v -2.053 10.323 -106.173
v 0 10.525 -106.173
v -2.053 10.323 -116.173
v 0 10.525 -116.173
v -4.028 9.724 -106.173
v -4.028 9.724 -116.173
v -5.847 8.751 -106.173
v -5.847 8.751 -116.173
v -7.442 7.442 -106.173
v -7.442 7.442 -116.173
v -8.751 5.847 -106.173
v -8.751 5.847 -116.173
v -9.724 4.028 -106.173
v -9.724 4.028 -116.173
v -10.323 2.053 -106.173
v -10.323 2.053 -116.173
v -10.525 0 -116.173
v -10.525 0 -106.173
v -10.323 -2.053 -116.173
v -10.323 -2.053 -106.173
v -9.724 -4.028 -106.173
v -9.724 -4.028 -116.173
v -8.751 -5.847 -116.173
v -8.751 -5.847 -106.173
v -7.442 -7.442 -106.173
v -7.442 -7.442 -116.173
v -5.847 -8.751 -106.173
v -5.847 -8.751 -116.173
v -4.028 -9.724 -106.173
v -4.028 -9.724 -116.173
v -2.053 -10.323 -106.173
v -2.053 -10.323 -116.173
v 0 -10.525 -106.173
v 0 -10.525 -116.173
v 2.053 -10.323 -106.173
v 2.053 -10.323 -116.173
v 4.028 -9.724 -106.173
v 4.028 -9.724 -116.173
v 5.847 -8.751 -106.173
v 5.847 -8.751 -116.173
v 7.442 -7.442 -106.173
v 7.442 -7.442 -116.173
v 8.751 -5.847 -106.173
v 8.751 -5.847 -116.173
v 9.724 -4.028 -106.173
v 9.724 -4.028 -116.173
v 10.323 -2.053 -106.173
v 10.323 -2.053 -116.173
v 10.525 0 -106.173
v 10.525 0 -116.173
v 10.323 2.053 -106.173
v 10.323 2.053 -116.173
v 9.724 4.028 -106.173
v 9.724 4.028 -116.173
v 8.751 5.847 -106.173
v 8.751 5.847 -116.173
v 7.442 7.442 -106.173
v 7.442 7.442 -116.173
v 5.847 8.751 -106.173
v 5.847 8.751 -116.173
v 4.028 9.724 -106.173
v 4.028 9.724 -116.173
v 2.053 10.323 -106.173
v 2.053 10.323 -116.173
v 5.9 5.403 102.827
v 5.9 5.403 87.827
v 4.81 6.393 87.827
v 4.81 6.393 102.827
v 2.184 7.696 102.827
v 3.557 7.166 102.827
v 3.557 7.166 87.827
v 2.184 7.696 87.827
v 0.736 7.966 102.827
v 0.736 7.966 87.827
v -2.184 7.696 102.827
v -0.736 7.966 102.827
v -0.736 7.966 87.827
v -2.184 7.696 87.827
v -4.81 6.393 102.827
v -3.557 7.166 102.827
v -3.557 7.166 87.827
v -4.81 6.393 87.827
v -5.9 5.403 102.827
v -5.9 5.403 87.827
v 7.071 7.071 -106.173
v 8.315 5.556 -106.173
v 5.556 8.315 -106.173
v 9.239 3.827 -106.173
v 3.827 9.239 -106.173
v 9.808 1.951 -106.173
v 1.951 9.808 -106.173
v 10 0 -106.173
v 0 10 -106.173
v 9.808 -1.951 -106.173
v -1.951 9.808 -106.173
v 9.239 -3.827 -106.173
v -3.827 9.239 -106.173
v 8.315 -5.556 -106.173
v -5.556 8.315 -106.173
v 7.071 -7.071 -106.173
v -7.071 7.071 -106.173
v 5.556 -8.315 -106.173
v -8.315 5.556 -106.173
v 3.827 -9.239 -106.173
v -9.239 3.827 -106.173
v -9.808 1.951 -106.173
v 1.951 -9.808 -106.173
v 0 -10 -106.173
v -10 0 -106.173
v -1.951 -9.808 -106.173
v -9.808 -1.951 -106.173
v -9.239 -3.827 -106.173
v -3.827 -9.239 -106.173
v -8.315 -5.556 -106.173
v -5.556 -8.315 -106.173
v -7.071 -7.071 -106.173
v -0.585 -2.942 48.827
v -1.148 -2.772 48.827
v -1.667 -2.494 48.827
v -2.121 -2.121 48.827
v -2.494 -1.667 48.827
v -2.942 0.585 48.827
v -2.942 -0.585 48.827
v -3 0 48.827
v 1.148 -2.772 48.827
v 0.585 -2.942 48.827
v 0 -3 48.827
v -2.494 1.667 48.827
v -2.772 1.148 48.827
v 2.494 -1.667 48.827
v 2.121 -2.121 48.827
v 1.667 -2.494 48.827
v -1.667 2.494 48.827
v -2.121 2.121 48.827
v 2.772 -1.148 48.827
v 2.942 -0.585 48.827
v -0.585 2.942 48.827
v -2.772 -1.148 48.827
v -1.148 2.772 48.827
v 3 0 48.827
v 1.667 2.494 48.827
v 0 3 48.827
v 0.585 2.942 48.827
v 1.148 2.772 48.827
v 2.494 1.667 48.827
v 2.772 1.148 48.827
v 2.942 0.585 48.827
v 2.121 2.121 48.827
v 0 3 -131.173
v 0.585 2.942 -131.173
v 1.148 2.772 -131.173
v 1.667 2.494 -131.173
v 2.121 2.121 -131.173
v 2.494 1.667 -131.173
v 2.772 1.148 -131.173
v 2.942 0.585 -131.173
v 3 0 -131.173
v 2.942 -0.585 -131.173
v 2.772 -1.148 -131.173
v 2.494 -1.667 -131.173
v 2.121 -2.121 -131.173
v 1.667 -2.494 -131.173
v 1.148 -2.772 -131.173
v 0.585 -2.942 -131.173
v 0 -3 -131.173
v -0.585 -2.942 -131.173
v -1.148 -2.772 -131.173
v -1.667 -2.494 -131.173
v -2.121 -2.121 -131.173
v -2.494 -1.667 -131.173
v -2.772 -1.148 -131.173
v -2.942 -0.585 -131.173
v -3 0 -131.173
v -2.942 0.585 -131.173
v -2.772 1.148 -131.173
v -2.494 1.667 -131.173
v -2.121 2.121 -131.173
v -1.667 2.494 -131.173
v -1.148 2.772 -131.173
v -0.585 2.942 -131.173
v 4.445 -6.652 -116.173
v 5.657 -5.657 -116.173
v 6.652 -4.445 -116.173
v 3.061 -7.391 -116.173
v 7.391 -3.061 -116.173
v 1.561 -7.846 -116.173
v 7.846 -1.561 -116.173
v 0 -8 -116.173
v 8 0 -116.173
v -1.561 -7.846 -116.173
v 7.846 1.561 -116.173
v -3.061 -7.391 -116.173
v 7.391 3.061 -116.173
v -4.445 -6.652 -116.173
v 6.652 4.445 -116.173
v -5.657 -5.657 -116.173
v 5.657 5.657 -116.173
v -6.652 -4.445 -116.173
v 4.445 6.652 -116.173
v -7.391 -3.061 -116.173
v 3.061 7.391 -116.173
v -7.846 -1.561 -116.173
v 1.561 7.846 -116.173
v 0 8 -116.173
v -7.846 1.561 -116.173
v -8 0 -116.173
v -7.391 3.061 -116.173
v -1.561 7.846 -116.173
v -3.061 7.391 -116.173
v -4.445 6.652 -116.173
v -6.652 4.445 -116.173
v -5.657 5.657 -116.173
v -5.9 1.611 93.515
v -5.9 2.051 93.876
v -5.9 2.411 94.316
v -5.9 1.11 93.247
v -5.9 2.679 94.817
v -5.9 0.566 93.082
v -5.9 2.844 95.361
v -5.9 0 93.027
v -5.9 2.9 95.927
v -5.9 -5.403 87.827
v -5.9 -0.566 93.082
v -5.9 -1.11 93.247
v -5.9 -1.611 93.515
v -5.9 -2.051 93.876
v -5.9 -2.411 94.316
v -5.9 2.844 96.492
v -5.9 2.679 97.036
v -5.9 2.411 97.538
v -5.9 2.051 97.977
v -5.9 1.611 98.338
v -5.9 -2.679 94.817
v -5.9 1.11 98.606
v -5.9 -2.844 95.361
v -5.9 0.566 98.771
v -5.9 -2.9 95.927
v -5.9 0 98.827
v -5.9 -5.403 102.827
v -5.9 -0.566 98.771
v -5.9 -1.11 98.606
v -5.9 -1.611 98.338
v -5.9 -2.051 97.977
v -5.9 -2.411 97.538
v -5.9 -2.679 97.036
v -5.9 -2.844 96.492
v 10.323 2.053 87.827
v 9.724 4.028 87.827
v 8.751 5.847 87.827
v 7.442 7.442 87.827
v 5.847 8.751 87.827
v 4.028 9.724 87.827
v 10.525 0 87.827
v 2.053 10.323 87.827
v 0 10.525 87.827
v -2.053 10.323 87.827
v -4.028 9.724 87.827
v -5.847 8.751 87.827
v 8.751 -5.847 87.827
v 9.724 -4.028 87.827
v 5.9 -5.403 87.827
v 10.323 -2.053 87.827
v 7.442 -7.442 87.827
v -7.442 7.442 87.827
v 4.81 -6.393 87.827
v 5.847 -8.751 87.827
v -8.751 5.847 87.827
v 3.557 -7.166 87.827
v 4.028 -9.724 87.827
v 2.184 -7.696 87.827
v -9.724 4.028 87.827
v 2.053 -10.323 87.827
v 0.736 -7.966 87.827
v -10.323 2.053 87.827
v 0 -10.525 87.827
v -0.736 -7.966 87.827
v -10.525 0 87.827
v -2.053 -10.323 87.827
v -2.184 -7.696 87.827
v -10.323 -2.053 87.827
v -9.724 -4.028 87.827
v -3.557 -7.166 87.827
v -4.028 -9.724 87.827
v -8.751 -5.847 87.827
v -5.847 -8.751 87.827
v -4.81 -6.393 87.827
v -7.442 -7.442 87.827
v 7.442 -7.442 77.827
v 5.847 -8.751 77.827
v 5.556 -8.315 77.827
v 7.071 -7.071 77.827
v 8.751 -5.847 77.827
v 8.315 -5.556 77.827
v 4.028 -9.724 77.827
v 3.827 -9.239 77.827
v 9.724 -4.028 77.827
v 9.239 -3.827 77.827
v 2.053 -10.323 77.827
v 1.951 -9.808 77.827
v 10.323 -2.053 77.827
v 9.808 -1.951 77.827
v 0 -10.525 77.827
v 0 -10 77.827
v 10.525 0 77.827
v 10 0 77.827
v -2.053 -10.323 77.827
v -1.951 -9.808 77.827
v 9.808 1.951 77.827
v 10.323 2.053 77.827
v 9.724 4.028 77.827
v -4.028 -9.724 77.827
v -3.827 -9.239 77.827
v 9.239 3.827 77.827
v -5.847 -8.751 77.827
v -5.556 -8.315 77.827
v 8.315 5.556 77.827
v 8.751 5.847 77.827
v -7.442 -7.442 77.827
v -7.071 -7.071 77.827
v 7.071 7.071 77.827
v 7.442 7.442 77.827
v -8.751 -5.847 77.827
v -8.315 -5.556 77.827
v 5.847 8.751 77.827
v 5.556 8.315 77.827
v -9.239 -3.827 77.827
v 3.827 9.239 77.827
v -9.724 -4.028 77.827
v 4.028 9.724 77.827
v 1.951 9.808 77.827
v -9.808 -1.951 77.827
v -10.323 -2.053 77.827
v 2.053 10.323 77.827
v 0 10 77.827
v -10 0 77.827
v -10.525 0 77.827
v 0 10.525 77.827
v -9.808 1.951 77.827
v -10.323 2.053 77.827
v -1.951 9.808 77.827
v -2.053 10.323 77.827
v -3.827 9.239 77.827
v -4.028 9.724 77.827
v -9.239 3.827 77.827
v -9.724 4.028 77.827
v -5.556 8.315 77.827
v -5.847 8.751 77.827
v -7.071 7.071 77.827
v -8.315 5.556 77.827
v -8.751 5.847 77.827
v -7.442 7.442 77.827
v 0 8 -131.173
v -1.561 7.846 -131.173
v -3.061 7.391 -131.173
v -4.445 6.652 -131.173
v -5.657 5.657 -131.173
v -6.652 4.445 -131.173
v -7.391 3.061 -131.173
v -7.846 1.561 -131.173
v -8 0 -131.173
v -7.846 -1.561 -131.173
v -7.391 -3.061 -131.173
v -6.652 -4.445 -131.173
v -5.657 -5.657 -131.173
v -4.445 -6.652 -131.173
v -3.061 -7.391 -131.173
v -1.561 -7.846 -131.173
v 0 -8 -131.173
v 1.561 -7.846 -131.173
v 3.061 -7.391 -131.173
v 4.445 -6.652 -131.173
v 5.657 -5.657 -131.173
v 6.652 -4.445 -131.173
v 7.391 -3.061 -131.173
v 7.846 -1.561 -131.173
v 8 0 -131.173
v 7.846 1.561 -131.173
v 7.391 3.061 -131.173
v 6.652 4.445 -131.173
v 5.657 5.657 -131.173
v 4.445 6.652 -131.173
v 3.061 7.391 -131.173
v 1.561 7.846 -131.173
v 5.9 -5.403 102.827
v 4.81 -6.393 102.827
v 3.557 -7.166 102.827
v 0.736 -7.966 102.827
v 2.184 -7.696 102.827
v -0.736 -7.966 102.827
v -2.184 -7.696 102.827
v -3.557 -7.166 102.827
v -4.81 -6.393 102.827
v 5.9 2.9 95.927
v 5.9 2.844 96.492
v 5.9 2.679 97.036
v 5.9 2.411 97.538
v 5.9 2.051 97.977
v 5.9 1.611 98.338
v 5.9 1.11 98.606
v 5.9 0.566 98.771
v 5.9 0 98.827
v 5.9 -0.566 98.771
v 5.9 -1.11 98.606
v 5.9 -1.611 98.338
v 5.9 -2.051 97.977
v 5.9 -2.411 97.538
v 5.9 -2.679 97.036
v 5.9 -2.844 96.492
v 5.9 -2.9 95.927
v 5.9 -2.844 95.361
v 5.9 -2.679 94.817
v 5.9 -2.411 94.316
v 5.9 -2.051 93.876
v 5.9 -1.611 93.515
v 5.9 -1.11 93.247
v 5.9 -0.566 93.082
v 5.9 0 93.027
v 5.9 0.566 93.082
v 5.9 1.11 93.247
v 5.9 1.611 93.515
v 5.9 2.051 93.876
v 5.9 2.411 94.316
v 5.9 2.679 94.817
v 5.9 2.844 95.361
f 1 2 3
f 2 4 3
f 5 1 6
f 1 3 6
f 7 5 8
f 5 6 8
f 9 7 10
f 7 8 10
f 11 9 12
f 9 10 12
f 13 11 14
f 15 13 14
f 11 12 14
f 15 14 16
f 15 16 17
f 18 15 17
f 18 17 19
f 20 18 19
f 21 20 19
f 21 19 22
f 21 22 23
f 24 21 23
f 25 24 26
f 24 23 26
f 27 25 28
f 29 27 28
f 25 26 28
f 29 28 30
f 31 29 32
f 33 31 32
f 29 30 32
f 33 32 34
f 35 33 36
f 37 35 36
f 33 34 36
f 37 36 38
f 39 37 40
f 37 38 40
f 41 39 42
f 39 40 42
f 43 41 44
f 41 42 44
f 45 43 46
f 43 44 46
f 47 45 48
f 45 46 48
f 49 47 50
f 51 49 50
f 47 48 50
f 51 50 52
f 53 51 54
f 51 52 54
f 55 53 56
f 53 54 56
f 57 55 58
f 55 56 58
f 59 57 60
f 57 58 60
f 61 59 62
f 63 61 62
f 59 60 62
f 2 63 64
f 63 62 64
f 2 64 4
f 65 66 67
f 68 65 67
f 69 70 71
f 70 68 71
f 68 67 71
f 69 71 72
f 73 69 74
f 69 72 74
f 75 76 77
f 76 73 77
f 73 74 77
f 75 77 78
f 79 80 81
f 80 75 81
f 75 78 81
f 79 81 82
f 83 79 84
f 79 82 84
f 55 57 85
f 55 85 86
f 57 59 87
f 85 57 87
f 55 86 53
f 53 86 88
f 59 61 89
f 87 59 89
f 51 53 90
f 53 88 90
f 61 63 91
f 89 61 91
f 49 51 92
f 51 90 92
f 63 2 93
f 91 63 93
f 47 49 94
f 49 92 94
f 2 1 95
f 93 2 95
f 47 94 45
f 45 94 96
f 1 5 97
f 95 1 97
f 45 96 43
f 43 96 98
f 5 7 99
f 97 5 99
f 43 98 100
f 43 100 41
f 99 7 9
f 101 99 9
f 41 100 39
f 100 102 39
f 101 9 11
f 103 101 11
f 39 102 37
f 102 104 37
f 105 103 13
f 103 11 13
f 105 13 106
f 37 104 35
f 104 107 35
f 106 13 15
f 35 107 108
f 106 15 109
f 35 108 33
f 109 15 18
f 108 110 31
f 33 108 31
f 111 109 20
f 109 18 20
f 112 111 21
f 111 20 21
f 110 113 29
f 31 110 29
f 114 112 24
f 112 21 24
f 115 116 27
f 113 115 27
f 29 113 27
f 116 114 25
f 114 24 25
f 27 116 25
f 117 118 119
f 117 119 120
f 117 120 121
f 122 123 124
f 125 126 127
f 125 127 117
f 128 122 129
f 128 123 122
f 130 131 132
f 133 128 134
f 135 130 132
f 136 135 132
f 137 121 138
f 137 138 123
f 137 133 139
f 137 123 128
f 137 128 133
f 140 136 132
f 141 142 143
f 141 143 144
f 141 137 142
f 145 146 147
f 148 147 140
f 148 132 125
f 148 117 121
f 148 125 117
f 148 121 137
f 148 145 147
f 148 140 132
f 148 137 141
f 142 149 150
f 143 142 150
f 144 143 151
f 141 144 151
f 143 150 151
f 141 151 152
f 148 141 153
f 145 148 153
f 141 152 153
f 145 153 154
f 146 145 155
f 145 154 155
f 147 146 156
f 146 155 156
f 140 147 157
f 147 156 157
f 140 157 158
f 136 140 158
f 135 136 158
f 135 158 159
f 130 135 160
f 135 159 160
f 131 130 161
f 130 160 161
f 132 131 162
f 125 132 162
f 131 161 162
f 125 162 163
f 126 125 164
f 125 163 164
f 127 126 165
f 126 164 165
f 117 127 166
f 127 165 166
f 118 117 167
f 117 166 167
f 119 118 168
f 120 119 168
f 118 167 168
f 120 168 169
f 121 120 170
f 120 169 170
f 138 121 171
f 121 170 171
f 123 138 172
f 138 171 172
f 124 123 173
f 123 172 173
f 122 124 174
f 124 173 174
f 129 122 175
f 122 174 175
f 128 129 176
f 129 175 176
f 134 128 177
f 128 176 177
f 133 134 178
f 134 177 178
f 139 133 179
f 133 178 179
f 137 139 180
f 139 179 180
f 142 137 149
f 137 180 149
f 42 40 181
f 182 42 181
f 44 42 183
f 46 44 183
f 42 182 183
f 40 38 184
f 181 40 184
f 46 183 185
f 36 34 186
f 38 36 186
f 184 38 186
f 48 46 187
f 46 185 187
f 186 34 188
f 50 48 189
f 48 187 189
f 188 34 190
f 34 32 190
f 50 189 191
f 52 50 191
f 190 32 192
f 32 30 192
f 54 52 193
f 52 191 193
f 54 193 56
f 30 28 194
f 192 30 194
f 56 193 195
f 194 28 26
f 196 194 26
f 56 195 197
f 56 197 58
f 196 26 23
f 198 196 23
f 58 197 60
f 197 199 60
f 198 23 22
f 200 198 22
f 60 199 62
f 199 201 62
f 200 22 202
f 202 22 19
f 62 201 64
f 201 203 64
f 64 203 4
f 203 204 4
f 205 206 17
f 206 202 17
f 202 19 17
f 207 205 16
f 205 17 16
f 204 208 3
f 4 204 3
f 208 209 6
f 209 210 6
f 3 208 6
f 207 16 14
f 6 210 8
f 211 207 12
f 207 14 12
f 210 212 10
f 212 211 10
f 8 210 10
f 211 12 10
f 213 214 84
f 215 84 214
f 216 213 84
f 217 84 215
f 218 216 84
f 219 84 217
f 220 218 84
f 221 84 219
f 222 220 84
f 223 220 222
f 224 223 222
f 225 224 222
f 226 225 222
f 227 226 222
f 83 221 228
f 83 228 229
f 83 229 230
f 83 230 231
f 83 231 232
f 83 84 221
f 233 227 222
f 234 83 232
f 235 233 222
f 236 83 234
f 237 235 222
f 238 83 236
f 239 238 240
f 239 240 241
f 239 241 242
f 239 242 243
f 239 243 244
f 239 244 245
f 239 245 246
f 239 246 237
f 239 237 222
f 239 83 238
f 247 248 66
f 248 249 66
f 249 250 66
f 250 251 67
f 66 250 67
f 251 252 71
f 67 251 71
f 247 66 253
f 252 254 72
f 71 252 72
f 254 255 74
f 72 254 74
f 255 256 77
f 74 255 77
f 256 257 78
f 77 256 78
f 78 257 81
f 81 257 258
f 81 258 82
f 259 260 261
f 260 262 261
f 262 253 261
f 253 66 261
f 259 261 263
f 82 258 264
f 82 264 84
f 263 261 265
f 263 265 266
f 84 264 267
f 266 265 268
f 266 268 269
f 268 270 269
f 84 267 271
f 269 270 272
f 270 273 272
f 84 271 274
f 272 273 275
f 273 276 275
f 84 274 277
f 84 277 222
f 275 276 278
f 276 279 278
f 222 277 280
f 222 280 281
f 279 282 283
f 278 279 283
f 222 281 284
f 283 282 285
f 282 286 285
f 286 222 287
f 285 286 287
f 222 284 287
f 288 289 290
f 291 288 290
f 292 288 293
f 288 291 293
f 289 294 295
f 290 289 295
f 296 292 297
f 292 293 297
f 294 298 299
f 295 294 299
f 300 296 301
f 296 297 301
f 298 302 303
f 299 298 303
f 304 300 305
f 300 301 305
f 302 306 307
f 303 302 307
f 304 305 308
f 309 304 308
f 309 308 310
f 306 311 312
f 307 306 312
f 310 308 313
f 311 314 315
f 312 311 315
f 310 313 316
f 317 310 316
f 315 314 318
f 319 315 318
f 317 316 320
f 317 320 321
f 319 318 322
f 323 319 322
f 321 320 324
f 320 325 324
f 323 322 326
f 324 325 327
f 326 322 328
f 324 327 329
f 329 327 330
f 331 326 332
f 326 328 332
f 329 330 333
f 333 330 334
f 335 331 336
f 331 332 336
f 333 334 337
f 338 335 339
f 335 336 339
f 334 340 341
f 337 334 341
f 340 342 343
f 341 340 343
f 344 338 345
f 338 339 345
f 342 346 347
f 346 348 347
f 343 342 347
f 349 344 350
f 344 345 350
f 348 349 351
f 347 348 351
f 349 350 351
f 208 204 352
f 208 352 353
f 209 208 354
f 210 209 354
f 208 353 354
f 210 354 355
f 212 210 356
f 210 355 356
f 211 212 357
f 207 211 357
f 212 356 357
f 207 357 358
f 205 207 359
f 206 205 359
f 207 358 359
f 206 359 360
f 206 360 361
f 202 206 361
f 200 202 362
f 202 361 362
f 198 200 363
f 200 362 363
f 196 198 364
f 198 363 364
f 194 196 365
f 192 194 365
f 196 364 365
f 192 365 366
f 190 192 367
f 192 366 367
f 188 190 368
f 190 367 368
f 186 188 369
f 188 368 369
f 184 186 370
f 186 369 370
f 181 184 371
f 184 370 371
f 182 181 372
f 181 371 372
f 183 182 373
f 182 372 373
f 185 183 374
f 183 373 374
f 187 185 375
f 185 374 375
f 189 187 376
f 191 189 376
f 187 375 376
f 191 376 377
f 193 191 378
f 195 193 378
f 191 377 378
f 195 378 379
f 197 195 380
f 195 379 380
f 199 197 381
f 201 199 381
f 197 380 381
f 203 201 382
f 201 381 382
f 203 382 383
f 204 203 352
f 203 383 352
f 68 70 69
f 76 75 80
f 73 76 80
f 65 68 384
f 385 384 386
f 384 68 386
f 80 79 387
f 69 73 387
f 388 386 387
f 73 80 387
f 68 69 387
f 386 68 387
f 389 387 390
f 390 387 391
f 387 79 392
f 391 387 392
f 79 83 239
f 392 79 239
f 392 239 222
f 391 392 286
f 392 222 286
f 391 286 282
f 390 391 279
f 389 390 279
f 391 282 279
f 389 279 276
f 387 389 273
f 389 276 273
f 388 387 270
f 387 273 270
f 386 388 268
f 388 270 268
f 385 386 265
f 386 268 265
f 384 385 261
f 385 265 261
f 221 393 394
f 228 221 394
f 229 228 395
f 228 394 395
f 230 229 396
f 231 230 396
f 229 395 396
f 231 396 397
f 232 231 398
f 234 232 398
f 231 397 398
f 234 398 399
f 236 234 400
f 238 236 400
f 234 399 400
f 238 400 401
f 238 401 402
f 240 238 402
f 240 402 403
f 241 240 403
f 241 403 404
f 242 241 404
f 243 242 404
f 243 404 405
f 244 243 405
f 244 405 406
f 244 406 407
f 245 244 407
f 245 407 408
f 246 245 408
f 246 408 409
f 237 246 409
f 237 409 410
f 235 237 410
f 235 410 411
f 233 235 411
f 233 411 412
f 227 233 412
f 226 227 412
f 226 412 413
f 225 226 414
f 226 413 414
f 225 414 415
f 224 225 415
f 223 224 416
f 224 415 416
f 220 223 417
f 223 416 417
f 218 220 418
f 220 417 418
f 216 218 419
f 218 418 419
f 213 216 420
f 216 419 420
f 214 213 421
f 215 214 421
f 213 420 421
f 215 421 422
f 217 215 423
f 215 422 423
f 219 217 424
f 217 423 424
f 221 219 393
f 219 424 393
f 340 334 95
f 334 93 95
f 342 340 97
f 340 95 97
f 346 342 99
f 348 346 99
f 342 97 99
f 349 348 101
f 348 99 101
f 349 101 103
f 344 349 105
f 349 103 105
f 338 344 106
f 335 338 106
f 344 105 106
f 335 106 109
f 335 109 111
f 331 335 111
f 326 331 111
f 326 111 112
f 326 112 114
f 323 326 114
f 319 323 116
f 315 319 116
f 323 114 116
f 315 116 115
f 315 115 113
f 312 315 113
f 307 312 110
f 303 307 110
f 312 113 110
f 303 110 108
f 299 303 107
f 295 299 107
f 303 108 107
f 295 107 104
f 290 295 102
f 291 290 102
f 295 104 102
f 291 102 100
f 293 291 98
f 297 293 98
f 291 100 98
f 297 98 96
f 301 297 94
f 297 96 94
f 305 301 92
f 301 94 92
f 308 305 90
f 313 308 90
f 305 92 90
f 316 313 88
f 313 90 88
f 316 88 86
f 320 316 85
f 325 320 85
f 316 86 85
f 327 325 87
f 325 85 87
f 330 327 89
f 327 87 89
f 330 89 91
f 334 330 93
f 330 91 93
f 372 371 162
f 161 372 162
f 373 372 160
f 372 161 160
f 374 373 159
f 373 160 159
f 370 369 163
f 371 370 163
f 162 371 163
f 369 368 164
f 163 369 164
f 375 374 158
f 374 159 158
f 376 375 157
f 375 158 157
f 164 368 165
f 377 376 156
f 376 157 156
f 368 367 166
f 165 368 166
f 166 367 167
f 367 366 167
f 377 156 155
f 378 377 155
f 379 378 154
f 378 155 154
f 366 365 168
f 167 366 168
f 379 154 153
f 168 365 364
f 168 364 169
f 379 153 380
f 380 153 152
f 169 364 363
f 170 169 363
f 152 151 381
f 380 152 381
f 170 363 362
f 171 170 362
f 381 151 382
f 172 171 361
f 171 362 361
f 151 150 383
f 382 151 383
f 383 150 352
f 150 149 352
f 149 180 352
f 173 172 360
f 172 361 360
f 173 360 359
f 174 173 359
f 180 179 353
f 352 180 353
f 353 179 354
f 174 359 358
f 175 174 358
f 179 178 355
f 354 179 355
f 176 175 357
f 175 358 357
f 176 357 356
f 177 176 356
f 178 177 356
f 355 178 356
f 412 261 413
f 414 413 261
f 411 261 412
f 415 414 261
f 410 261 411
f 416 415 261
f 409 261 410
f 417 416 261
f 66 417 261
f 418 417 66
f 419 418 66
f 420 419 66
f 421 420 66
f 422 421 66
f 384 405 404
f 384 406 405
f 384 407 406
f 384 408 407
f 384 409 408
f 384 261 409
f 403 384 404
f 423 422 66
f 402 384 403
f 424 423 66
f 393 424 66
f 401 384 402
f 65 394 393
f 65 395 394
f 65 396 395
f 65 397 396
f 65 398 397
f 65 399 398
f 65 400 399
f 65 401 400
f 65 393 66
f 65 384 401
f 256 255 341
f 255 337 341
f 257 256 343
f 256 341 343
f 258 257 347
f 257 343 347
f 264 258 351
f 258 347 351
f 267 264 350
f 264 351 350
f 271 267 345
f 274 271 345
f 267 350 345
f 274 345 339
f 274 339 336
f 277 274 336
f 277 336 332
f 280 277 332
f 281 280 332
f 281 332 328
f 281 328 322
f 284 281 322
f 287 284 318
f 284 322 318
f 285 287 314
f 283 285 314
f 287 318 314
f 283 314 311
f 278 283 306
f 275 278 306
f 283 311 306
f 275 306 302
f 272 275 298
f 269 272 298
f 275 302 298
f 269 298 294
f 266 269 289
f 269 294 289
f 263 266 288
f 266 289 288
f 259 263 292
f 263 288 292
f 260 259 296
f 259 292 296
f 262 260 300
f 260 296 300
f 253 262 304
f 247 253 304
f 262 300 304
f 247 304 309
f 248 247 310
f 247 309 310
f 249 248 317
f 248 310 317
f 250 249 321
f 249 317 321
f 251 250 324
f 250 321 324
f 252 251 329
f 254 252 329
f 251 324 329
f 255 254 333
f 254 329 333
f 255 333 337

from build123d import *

# Parameters (mm, degrees)
CUT_EXTRUDE1_DEPTH = 15
SKETCH4_R          = 2.9
CUT_EXTRUDE2_DEPTH = 17.425
SKETCH5_R          = 3
CUT_EXTRUDE3_DEPTH = 180


with BuildPart() as part:
    # Sketch2 → Revolve1 (revolve)
    with BuildSketch(Plane(origin=(0, 0, 0), x_dir=(0, 0, -1), z_dir=(1, 0, 0))):
        Polygon((116.173333333, 10.525), (116.173333333, 8), (131.173333333, 8), (131.173333333, 0), (-102.826666667, 0), (-102.826666667, 8), (-87.826666667, 8), (-87.826666667, 10.525), (-77.826666667, 10.525), (-77.826666667, 10), (106.173333333, 10), (106.173333333, 10.525), align=None)
    revolve(axis=Axis((0, 0, -131.173333333), (0, 0, 1)))

    # Sketch3 → Cut-Extrude1 (cut)
    with BuildSketch(Plane.XY.offset(102.826666667)):
        with BuildLine():
            Line((-5.9, 5.402777064), (-5.9, -5.402777064))
            ThreePointArc((-5.9, -5.402777064), (-8, 0), (-5.9, 5.402777064))
        make_face()
        with BuildLine():
            Line((5.9, -5.402777064), (5.9, 5.402777064))
            ThreePointArc((5.9, 5.402777064), (8, 0), (5.9, -5.402777064))
        make_face()
    extrude(amount=-CUT_EXTRUDE1_DEPTH, mode=Mode.SUBTRACT)

    # Sketch4 → Cut-Extrude2 (cut, through all)
    with BuildSketch(Plane(origin=(5.9, 0, 0), x_dir=(0, 0, -1), z_dir=(1, 0, 0))):
        with Locations(Location((-95.926666667, 0, 0), (0, 0, 90))):  # turned: the seam where the file's is
            Circle(SKETCH4_R)
    extrude(amount=-CUT_EXTRUDE2_DEPTH, mode=Mode.SUBTRACT)

    # Sketch5 → Cut-Extrude3 (cut)
    with BuildSketch(Plane(origin=(0, 0, -131.173333333), x_dir=(-1, 0, 0), z_dir=(0, 0, -1))):
        with Locations(Location((0, 0, 0), (0, 0, 90))):  # turned: the seam where the file's is
            Circle(SKETCH5_R)
    extrude(amount=-CUT_EXTRUDE3_DEPTH, mode=Mode.SUBTRACT)


solid = part.part
